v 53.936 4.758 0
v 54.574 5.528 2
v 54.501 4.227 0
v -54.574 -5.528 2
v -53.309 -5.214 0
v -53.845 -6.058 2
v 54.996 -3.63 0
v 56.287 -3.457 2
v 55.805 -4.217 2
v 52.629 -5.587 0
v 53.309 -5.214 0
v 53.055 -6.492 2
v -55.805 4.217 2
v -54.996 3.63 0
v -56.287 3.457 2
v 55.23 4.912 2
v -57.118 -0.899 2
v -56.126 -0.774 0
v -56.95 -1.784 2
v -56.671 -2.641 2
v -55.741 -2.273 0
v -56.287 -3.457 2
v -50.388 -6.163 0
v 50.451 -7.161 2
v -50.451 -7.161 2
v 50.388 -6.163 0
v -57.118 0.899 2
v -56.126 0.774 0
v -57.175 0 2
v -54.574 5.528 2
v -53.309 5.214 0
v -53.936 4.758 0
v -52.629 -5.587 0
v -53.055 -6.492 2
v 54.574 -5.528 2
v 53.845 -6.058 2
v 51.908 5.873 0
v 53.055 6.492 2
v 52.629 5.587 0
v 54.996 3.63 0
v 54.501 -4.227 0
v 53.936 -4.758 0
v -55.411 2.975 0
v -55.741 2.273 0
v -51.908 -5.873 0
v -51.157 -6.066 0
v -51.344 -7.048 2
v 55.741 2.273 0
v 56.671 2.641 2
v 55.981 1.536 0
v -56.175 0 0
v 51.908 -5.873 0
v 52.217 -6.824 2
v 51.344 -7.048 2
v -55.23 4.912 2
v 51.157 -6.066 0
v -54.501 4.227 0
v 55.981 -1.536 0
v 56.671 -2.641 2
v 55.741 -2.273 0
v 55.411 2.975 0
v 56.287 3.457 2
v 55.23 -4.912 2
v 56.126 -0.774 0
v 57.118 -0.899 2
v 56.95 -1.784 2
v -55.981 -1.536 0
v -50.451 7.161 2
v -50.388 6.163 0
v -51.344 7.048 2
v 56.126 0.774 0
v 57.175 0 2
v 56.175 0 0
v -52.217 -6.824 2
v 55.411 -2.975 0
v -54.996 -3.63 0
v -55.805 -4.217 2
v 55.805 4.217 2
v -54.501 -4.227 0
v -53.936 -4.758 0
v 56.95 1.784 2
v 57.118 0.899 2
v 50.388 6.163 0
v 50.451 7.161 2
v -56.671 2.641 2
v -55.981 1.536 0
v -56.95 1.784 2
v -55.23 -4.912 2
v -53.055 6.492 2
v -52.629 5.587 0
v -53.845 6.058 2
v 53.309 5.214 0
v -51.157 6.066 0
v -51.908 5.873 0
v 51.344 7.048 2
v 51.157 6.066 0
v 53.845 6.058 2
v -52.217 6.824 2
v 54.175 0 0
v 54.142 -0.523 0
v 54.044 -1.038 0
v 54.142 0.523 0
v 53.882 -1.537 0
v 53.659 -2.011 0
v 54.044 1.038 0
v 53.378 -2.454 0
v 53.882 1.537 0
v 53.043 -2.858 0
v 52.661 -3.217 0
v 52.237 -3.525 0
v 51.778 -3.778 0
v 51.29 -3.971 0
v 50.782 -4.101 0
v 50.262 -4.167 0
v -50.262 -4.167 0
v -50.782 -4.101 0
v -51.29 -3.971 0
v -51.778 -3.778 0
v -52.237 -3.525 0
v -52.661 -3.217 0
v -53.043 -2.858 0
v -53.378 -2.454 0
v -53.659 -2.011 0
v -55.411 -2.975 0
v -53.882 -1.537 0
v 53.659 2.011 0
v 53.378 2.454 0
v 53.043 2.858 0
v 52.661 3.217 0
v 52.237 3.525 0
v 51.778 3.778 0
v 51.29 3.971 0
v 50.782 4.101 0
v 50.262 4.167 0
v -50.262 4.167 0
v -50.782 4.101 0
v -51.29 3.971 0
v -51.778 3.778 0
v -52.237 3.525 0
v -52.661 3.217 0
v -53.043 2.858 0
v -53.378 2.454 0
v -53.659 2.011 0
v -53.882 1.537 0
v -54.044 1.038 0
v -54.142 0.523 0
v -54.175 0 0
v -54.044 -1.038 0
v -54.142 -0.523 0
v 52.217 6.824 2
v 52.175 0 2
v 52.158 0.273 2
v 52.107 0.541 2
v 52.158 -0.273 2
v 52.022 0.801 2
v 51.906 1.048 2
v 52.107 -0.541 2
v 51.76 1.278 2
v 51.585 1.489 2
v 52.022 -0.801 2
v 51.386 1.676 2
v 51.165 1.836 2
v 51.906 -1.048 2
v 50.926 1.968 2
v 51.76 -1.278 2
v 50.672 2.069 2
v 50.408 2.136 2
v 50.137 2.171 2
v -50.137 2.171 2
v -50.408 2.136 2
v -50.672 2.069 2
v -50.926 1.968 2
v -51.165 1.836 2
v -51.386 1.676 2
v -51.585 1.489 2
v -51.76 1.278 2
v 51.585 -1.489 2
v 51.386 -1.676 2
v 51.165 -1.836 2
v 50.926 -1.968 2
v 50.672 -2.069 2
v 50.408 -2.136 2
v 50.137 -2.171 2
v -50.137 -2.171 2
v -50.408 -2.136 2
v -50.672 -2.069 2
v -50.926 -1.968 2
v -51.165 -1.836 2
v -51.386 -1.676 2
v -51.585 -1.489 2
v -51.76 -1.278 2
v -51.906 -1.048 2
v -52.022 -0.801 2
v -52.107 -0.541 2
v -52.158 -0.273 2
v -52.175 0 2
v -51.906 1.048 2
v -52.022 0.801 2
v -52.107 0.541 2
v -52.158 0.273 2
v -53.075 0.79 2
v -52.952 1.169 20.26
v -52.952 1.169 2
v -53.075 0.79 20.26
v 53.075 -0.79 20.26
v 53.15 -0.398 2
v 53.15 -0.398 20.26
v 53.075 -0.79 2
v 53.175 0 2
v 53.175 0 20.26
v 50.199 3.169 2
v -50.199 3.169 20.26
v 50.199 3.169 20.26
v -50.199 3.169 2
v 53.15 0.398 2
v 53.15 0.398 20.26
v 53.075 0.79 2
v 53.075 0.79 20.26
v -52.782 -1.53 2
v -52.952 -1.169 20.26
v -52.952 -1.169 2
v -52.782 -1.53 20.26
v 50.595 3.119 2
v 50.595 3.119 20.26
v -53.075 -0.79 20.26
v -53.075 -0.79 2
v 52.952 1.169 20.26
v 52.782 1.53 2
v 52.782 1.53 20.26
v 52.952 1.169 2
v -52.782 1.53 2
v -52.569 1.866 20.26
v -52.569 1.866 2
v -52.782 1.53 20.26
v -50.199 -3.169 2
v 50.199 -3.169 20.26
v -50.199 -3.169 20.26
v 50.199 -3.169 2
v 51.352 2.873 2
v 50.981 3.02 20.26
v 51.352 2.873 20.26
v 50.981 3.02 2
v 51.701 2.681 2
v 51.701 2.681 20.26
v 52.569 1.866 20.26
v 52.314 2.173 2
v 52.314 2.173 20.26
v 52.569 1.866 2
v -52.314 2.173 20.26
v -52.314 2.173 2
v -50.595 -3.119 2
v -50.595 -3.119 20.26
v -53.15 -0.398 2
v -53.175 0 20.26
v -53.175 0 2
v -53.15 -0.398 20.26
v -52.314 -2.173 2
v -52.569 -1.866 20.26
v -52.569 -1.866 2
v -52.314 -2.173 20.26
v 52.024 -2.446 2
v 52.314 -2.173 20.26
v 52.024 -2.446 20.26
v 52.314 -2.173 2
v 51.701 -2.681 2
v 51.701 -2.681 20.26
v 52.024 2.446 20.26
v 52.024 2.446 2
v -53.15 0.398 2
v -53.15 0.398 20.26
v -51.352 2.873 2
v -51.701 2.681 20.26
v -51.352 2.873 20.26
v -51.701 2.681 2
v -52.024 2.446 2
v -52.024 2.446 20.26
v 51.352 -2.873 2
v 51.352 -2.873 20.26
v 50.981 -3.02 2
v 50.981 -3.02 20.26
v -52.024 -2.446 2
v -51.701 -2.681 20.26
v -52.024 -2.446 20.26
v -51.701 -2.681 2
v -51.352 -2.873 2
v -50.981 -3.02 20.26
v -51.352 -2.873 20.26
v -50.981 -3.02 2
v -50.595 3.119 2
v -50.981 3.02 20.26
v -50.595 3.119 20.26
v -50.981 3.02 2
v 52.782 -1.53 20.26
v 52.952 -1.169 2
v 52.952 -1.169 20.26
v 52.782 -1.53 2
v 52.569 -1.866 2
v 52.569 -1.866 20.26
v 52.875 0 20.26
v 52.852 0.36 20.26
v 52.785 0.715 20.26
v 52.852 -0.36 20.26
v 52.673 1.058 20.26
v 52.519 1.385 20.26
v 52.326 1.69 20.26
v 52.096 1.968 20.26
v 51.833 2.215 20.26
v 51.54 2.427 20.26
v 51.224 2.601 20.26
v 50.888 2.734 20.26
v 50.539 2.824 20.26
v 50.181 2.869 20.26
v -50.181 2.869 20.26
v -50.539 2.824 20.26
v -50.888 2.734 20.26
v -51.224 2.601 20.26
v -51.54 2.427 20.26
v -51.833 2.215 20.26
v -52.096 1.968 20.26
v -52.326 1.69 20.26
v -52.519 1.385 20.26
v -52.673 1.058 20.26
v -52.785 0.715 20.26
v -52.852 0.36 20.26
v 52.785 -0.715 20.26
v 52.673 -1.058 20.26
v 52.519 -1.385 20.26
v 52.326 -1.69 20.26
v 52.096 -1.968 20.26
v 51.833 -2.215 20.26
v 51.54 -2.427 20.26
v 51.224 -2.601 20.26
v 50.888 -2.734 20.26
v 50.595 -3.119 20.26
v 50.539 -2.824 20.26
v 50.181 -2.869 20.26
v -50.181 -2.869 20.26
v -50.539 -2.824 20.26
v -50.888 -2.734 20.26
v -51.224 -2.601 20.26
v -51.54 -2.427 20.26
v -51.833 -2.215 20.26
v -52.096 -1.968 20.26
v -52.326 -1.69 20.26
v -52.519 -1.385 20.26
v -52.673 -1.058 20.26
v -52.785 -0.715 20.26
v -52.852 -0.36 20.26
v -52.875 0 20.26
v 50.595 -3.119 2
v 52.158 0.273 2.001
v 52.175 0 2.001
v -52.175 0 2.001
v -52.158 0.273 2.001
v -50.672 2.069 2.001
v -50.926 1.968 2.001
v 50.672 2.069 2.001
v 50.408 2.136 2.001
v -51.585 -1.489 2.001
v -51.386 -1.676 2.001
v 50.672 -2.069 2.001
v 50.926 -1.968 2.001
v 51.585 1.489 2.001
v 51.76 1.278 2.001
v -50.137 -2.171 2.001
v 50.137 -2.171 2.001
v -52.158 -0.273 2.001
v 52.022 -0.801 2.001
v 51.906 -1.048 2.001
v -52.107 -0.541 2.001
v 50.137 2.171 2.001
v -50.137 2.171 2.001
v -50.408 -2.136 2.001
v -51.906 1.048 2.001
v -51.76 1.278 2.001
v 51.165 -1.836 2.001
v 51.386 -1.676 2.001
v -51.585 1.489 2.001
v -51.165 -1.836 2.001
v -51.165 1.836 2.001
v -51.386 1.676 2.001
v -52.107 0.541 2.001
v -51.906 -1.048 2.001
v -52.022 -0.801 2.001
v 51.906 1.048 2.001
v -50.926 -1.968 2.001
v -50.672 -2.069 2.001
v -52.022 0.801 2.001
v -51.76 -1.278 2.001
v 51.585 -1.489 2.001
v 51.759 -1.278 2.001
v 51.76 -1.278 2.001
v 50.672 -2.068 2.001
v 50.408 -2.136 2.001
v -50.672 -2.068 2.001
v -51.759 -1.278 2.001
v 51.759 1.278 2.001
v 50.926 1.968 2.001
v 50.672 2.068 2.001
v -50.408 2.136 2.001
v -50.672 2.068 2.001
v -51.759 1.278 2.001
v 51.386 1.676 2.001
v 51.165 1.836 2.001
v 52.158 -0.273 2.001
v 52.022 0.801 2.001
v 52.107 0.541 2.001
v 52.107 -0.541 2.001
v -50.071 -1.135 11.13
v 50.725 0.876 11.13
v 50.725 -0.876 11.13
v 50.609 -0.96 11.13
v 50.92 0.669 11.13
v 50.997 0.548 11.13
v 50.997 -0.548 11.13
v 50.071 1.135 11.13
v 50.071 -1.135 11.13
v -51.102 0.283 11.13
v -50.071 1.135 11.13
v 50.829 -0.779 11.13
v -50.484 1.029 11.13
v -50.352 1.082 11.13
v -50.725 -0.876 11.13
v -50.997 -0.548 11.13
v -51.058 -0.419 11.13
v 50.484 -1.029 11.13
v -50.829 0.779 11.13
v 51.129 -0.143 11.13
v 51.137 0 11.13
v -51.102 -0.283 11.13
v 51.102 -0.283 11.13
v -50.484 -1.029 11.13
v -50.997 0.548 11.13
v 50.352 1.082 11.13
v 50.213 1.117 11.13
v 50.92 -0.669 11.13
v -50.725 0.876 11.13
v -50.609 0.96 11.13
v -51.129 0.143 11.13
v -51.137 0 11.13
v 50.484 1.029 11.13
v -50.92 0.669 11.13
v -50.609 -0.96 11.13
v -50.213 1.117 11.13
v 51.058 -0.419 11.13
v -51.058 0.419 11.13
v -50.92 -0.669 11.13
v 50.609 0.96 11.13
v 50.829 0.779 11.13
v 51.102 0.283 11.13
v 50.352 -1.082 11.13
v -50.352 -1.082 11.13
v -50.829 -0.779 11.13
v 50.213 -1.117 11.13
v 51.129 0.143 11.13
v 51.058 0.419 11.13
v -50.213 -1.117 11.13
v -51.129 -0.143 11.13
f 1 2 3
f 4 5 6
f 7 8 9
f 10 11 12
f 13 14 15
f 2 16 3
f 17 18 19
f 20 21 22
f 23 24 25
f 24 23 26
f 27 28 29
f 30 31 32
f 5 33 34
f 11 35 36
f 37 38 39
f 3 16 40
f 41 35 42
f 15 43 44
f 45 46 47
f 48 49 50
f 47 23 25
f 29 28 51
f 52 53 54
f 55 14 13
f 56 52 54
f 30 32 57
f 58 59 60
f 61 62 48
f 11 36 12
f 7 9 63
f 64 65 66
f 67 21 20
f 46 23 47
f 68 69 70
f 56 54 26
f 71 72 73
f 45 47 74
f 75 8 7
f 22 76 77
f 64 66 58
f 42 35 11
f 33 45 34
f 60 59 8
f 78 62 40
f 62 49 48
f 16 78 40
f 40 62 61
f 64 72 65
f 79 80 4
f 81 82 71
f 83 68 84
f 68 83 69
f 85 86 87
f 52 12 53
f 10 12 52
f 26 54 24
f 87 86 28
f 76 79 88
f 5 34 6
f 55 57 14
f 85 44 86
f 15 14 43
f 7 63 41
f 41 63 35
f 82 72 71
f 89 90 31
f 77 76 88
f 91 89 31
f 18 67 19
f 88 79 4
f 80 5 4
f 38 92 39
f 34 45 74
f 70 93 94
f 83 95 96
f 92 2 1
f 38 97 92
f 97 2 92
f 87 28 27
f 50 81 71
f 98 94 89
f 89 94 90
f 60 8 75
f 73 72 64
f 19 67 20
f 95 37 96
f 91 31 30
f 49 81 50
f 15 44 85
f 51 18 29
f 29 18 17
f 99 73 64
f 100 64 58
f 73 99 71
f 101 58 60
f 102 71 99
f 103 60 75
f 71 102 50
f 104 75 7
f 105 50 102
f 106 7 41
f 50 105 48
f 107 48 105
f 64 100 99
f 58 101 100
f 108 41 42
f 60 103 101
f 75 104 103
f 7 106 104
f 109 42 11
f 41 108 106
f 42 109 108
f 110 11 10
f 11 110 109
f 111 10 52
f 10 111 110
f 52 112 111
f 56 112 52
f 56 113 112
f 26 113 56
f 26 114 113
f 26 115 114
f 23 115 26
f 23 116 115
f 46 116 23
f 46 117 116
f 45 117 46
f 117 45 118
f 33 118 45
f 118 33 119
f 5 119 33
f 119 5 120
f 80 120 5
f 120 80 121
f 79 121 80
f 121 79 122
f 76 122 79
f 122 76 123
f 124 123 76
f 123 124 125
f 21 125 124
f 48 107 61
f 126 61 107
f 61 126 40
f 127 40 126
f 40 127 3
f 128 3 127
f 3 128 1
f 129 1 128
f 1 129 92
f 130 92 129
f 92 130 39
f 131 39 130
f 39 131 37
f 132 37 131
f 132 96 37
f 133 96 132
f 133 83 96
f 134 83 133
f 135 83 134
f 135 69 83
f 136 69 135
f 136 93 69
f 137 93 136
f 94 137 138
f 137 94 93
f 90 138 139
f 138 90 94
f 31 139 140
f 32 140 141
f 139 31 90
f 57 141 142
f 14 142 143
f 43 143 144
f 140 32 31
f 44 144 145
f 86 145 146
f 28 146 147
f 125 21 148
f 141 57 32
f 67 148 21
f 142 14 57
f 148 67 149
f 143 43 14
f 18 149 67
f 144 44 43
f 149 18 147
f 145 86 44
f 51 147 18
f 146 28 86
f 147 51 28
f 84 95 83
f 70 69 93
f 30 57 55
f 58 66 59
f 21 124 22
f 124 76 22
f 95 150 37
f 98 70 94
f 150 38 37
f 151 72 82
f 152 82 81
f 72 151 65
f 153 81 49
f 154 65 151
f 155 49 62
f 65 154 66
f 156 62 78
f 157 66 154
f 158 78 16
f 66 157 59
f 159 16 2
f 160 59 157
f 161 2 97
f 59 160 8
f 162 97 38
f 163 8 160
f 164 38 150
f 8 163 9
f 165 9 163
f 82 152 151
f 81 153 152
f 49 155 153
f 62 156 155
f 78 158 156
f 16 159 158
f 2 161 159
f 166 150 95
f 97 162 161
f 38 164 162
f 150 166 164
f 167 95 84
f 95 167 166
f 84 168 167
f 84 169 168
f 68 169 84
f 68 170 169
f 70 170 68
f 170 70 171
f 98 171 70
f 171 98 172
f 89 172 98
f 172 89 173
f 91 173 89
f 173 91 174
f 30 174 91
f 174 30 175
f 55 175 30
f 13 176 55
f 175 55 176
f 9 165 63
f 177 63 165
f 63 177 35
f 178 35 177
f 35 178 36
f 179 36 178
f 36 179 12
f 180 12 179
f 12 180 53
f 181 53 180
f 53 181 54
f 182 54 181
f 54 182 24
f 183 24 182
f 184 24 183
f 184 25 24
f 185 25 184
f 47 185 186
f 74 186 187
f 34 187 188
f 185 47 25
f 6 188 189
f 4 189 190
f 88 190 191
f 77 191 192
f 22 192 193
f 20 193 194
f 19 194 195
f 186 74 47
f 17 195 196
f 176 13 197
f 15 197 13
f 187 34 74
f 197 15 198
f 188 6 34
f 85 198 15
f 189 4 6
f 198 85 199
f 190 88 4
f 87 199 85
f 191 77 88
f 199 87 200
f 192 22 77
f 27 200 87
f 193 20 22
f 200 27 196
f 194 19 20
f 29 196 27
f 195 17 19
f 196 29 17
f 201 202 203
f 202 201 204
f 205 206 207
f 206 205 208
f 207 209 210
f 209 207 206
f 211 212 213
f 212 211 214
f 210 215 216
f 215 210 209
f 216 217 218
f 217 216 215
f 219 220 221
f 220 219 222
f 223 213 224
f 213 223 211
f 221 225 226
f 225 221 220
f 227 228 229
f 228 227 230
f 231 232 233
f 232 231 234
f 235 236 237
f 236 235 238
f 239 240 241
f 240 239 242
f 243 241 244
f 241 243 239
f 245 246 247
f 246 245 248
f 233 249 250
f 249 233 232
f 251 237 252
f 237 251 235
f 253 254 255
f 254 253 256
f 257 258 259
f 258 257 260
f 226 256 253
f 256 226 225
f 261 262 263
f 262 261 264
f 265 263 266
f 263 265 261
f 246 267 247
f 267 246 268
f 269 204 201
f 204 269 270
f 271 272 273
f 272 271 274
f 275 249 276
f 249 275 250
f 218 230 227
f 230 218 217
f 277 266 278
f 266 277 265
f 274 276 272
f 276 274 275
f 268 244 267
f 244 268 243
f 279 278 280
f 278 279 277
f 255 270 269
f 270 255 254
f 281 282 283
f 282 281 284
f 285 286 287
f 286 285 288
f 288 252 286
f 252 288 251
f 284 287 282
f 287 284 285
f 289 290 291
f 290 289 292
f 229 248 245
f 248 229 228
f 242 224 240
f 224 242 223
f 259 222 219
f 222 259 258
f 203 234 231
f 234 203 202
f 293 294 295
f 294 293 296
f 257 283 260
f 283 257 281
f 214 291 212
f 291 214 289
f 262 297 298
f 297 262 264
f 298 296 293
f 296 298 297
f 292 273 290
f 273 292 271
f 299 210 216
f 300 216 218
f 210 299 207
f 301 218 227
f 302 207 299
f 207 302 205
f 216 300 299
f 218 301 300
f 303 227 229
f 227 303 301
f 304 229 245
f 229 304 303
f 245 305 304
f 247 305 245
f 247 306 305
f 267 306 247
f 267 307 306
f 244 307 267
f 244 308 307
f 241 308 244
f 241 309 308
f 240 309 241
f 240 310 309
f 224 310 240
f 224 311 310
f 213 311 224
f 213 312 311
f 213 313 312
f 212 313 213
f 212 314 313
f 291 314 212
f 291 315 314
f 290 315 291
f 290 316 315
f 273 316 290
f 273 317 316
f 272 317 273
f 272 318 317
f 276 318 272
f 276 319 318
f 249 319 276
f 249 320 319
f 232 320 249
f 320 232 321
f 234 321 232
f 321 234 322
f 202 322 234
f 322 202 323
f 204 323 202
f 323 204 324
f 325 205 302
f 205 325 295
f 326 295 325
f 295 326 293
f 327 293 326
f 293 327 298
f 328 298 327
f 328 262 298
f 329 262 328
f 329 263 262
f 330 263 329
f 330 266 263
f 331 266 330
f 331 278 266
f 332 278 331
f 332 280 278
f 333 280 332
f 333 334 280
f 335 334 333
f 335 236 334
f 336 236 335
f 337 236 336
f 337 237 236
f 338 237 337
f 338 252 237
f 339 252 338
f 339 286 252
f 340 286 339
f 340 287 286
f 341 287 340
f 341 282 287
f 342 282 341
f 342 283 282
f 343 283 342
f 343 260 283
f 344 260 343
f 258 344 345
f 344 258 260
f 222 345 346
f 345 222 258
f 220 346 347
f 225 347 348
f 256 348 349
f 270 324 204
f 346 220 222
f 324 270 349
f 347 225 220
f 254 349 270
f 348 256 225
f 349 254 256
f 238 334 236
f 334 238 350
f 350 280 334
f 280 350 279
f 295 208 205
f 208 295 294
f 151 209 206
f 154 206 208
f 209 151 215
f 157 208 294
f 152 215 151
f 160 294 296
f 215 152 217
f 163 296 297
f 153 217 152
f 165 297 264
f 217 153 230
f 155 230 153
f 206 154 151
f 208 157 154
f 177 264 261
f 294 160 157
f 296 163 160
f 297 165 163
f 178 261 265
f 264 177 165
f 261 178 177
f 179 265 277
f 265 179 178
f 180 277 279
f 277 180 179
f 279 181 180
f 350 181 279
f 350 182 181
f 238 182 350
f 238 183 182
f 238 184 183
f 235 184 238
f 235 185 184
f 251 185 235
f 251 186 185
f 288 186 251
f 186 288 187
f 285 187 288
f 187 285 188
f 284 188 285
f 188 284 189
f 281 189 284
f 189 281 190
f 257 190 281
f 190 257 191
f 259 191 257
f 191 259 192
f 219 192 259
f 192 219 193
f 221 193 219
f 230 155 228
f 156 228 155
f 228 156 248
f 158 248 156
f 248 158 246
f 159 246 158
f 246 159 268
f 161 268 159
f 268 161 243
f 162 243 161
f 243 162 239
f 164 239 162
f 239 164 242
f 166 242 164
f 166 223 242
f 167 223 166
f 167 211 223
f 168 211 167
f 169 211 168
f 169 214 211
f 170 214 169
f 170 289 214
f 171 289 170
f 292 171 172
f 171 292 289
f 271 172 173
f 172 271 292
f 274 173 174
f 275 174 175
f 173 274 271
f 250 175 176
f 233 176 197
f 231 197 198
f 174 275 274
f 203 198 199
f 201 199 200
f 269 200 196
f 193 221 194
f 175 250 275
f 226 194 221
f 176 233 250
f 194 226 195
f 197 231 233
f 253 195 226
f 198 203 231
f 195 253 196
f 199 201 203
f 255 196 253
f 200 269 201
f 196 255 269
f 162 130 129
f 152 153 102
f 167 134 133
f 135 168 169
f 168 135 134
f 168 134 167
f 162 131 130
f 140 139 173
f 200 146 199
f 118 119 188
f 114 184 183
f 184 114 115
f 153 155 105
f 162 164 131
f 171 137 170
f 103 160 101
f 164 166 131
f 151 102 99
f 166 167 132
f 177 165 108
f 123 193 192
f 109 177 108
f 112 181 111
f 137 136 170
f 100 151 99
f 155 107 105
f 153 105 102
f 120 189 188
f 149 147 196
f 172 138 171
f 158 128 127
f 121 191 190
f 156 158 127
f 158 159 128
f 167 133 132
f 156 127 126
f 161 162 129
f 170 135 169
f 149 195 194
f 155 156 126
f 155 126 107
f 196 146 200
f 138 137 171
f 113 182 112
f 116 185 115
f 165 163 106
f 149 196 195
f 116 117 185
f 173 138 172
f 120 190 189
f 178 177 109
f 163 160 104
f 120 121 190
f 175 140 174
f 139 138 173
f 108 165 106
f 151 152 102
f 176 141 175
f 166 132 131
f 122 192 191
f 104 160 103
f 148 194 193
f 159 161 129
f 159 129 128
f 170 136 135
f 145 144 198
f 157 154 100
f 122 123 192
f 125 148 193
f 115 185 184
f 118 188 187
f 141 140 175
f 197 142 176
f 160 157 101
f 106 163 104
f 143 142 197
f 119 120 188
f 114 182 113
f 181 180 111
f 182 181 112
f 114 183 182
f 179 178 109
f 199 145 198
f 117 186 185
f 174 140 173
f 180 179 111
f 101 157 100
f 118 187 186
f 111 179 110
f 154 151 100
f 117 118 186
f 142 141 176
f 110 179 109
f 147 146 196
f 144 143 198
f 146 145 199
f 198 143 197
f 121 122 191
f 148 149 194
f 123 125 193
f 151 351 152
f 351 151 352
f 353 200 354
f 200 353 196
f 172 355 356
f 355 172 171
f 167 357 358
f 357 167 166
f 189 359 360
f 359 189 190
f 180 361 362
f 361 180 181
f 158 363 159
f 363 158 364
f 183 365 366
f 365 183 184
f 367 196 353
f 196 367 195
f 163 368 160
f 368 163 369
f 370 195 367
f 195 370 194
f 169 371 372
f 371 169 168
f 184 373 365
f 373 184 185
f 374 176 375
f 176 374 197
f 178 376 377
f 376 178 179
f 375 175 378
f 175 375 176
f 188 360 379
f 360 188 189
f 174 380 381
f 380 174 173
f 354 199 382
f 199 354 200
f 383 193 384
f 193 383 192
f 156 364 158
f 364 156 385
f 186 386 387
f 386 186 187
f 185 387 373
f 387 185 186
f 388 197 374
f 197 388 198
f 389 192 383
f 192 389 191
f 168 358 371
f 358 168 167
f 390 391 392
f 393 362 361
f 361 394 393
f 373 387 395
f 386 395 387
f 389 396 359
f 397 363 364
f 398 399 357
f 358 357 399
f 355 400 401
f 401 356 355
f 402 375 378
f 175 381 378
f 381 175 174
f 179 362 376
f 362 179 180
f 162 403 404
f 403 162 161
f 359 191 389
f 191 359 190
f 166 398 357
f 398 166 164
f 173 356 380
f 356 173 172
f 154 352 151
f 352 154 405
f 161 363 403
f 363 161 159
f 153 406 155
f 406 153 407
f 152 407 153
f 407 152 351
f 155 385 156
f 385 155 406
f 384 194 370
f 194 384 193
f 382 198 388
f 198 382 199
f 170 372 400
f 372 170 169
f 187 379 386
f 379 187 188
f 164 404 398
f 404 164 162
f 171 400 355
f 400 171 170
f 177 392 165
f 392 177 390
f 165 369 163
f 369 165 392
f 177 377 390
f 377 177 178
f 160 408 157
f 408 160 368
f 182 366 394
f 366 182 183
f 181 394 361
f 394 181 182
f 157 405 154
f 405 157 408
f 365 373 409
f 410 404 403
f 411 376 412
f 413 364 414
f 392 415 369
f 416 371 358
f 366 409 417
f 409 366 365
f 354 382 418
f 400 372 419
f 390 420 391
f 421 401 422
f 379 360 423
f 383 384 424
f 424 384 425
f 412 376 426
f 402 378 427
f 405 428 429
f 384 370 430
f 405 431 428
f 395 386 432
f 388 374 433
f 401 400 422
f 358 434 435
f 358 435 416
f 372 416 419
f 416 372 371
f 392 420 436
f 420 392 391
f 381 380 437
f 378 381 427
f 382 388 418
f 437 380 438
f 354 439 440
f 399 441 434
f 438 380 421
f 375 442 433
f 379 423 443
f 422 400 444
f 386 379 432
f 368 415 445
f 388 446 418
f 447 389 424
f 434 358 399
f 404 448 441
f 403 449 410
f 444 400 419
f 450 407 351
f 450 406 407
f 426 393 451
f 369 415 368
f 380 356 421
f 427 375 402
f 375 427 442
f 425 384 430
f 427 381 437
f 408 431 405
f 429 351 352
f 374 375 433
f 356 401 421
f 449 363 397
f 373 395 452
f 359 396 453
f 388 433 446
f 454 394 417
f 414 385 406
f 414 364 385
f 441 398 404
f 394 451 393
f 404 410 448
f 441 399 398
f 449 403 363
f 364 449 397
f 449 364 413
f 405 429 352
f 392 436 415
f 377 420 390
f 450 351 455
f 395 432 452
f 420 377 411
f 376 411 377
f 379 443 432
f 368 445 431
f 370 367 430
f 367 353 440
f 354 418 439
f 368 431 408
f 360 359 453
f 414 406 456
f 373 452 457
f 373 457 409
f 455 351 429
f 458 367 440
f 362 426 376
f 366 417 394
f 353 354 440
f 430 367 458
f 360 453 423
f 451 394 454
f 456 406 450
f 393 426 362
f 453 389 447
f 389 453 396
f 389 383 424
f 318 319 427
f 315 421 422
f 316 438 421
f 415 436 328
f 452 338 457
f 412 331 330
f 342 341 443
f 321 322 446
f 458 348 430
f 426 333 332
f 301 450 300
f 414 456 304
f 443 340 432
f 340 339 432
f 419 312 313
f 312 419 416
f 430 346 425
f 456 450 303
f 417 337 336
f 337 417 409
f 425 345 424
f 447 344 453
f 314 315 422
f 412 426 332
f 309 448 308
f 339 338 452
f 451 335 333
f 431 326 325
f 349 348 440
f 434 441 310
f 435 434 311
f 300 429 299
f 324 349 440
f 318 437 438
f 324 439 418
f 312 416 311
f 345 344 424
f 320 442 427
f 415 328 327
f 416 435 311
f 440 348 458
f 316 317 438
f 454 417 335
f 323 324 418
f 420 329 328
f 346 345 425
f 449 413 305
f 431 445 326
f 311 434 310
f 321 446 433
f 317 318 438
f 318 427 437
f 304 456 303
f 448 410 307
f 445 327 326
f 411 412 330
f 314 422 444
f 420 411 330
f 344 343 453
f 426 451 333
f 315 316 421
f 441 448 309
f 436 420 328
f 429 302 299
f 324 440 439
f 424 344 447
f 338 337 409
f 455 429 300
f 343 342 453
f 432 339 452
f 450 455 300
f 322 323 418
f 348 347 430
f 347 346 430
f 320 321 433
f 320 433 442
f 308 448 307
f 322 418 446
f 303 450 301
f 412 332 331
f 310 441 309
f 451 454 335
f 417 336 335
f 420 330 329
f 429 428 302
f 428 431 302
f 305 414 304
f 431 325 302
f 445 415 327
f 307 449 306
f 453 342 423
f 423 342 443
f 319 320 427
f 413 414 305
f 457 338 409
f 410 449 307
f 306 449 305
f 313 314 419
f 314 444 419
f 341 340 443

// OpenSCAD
/* [Rendering Options] */
// Render in print orientation (upside down)
Print_Orientation = true;

/* [Size] */
// All units in millimeters

// Thickness of surface the grommet will pass through
Height = 18.26; // [1:0.01:100]
// Horizontal width of the grommet cutout, without the rounded ends (Set to 0 for a circular grommet)
Width = 100; // [0:1500]
// Horizontal depth of the grommet cutout
Depth = 6.35; // [2:0.05:20]

Filament_Size = 1.75; // [1.75: 1.75mm, 3: 3mm]

/* [Advanced Options] */

// Height of top lip of grommet that sits above the surface
Lip_Height = 2; // [1:1:10]

// Width of the filament channel; may be less then or equal to the grommet width (Set to -1 to use Width)
Opening_Width = -1; // [-1:1:500]

// Make the filament channel this percentage wider than the filament size
Filament_Diameter_Tolerance_Percent = 30; // [0:1:100]

module __end_customizer_options__() { }

// Constants //

$fn = $preview ? 10 : 50;

// Modules //

module cutout_shape(radius, width) {
    hull()
    for(m = [0:1]) {
        mirror([m, 0])
        translate([-width/2, 0])
        circle(radius);
    }
}

module hull_stack(height, mirr=false, cut=false) {
    // Takes two children
    // Set the first child as the larger polygon
    slop = 0.001;
    translate([0, 0, mirr ? height : 0])
    mirror([0, 0, mirr ? 1 : 0])
    difference() {
        hull()
        union() {
            translate([0, 0, -slop])
            linear_extrude(height=slop)
            children(0);

            translate([0, 0, height - slop])
            linear_extrude(height=slop)
            children(1);
        }
        if (!cut) {
            translate([0, 0, -slop])
            linear_extrude(height=slop)
            children(0);
        }
    }
    if (cut) {
        translate([0, 0, -slop])
        linear_extrude(height=slop)
        children(1);
    }
}


module grommet() {
    fs = Filament_Size * (1 + Filament_Diameter_Tolerance_Percent / 100);
    ow = Opening_Width == -1 ? Width : min(Width, Opening_Width);

    difference() {
        union() {
            translate([0, 0, Height])
            hull_stack(Lip_Height, mirr=false) {
                cutout_shape(Depth / 2 + Lip_Height * 2, Width);
                cutout_shape(Depth / 2 + Lip_Height * 1.5, Width);
            }
            linear_extrude(height=Height)
            cutout_shape(Depth/2, Width);
        }
        translate([0, 0, Height])
        hull_stack(Lip_Height, mirr=true, cut=true) {
            cutout_shape((Depth / 2 + Lip_Height) - max(1, Lip_Height / 2), Width);
            cutout_shape(Depth / 2 - 1, Width);
        }
        translate([0, 0, Height / 2])
        hull_stack(Height / 2, mirr=true, cut=true) {
            cutout_shape(Depth / 2 - 1, Width);
            cutout_shape(fs / 2, ow);
        }
        hull_stack(Height / 2, cut=true) {
            cutout_shape((Depth / 2) - 0.3, Width);
            cutout_shape(fs / 2, ow);
        }
    }
}

module main() {
    color("skyblue")
    translate([0, 0, Print_Orientation ? Height + Lip_Height : 0])
    rotate([0, Print_Orientation ? 180 : 0, 0])
    grommet();
}

main();
